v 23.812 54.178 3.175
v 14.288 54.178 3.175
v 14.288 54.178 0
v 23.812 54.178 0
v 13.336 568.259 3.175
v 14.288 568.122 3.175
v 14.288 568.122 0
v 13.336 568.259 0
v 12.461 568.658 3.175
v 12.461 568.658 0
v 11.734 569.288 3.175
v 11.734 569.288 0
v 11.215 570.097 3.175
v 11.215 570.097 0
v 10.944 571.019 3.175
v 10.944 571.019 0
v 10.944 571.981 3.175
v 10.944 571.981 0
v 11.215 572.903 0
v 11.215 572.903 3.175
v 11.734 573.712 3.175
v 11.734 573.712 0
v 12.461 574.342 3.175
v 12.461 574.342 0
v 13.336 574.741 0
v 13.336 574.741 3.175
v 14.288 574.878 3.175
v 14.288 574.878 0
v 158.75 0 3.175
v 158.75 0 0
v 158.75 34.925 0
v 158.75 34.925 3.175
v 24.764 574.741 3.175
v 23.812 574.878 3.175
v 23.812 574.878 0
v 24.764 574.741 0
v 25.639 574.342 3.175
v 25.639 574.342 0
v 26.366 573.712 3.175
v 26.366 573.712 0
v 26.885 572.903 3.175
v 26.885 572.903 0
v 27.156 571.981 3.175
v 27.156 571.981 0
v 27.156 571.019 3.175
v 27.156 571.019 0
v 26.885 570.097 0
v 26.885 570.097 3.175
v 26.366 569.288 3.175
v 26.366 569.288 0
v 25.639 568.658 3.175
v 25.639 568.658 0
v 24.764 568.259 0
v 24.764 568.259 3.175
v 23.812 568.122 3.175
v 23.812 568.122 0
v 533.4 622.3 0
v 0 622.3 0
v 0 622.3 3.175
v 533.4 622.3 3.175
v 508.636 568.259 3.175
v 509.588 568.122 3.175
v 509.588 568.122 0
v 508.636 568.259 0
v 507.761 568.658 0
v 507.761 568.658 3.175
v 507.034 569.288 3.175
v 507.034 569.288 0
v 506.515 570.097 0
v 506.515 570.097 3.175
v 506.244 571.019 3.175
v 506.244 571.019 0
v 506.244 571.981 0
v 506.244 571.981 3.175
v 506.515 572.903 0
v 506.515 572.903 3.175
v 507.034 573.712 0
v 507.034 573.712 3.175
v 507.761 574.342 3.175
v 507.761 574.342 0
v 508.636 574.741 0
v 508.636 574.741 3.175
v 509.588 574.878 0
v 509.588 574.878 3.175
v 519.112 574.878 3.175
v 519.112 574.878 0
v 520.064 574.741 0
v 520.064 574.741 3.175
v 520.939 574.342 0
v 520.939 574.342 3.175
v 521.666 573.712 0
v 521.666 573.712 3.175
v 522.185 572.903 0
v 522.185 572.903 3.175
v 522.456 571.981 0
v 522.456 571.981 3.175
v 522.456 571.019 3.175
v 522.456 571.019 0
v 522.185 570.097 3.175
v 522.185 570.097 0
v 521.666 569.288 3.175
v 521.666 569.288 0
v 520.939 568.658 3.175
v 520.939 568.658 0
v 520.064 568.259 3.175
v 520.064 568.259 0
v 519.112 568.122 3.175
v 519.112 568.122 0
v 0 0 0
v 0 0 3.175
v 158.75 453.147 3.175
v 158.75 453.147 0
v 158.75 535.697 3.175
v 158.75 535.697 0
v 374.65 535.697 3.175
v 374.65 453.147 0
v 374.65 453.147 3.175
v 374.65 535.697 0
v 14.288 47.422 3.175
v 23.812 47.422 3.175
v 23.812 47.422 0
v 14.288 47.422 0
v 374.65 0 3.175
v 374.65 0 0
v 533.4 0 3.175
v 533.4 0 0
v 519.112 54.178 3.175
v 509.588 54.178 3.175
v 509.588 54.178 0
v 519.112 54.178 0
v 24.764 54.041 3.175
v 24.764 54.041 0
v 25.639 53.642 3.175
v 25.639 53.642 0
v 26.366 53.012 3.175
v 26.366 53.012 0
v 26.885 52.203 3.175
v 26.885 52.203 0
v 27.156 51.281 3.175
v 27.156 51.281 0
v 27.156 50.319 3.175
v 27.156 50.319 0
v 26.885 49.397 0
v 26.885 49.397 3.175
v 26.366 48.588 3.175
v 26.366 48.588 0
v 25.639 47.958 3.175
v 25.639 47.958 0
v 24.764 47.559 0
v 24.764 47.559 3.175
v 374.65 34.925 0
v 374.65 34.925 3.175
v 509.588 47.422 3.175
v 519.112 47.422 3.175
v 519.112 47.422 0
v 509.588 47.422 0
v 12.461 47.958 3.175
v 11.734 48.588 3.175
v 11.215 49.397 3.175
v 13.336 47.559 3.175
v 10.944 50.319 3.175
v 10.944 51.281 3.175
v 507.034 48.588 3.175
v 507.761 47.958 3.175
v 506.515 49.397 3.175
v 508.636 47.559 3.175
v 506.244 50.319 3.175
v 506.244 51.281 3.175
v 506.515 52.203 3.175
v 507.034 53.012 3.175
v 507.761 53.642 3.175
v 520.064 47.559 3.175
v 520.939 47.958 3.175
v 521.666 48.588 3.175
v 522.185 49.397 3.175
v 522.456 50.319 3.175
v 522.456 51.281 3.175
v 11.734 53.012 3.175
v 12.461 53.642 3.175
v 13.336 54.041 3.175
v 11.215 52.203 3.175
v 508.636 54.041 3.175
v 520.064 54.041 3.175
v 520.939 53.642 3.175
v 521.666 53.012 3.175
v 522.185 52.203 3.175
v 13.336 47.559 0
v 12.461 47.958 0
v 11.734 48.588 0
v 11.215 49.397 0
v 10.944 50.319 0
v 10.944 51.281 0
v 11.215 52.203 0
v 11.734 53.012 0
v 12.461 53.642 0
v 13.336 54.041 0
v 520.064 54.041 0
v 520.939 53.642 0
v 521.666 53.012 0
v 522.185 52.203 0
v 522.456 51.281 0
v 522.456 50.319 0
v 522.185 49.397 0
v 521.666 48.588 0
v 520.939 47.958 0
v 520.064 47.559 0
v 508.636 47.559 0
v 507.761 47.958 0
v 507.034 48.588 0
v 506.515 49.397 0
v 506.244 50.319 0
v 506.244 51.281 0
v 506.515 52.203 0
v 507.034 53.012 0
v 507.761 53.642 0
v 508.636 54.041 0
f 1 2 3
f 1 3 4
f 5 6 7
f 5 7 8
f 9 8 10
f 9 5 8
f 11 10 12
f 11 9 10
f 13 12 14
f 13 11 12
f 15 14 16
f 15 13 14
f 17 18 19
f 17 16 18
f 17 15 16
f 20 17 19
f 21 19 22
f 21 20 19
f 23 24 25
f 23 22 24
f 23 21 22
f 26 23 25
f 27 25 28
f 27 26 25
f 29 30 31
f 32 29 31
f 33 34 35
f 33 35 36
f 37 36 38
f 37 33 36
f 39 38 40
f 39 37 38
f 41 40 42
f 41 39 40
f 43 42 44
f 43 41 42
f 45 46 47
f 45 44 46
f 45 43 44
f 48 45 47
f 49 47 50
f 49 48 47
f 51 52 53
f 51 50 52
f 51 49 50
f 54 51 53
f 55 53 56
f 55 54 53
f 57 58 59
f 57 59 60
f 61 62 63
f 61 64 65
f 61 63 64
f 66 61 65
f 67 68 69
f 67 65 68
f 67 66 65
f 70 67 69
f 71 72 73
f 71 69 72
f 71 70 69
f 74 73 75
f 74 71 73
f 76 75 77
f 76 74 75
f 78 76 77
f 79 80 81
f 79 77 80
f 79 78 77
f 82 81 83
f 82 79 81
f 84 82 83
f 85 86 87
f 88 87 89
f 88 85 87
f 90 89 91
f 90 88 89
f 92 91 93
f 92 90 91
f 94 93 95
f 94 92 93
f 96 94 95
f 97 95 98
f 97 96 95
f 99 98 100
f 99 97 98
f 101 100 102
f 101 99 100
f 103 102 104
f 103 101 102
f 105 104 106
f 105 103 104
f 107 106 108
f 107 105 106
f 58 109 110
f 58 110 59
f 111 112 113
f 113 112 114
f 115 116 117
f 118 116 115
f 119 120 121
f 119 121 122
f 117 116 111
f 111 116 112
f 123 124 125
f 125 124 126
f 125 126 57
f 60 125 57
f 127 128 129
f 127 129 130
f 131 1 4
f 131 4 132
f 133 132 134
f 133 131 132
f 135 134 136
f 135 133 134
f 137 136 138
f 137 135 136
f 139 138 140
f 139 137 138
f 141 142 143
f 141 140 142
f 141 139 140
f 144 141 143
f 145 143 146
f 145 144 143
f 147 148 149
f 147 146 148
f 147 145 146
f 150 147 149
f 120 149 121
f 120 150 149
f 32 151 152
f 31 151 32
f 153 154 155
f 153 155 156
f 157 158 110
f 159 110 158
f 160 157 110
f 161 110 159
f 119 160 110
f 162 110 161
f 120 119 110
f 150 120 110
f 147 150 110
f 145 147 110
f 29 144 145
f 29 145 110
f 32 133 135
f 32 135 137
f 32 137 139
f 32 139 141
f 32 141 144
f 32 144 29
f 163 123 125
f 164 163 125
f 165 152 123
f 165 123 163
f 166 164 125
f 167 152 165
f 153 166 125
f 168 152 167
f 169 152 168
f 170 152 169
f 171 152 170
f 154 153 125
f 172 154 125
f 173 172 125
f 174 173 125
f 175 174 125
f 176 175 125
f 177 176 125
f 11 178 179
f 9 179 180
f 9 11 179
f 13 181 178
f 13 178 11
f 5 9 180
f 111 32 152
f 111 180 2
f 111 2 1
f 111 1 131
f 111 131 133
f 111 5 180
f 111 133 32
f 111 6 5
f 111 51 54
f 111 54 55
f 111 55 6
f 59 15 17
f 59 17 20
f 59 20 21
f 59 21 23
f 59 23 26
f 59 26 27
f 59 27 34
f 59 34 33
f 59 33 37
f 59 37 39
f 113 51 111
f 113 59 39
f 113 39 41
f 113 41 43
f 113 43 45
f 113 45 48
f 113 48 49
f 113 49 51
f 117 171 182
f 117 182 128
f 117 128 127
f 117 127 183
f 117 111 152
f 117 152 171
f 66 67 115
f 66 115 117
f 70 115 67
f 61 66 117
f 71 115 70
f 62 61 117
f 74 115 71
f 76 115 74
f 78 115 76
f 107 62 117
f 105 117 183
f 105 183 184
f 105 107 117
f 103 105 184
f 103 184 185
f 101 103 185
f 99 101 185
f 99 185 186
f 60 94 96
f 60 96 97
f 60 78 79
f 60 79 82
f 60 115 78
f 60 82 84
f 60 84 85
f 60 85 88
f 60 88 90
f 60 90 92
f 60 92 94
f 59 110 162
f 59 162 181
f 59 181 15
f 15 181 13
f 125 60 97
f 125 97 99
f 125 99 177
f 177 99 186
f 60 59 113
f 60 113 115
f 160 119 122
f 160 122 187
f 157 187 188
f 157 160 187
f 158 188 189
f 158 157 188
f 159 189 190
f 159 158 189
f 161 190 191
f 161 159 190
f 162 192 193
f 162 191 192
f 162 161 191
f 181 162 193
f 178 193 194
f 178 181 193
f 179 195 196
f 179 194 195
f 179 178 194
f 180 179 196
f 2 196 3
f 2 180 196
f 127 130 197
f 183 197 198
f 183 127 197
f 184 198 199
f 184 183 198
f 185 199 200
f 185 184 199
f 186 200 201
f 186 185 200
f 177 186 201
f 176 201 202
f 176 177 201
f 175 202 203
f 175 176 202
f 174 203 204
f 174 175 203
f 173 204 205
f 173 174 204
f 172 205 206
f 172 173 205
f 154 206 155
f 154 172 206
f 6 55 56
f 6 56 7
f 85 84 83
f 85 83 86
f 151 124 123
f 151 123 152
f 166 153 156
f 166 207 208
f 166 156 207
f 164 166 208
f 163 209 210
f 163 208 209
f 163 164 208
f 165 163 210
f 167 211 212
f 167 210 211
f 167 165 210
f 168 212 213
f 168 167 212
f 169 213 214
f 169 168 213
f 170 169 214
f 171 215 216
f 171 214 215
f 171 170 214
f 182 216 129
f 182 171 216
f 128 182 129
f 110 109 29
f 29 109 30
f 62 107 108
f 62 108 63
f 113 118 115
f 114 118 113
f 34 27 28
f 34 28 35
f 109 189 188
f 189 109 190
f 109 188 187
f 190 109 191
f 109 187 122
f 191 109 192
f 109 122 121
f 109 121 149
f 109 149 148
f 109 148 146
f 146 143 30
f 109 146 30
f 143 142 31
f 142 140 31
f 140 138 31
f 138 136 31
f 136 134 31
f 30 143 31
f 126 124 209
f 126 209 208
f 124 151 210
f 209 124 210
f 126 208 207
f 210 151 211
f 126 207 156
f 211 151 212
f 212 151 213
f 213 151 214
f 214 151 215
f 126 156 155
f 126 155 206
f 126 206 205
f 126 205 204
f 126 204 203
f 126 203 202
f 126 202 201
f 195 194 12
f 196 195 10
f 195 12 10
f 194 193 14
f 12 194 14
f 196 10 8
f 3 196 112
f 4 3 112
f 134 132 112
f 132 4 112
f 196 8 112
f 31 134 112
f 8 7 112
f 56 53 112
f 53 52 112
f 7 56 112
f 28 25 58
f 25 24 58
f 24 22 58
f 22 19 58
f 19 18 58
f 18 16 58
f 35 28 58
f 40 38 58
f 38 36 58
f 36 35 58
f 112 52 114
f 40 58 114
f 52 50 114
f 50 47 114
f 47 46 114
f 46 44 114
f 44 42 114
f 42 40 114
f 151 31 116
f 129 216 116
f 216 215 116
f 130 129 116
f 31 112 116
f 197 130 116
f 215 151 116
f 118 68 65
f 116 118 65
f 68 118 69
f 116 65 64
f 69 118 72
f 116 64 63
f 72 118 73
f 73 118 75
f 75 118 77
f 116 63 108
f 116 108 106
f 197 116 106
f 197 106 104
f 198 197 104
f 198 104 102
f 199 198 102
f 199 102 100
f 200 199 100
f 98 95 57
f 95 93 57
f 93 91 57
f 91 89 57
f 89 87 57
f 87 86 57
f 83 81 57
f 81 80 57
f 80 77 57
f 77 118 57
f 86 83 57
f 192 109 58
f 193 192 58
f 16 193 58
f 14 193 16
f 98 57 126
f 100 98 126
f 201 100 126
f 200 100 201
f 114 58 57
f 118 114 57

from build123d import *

# Parameters (mm, degrees)
SKETCH1_W            = 533.4
SKETCH1_H            = 622.3
BOSS_EXTRUDE1_DEPTH  = 3.175
CUT_EXTRUDE1_DEPTH   = 4.175
LPATTERN1_COUNT      = 2
LPATTERN1_PITCH      = 520.7
LPATTERN1_COUNT_DIR2 = 2
LPATTERN1_PITCH_DIR2 = 495.3
SKETCH5_W            = 215.9
SKETCH5_H            = 82.55
CUT_EXTRUDE3_DEPTH   = 4.175
SKETCH6_W            = 215.9
SKETCH6_H            = 34.925
CUT_EXTRUDE4_DEPTH   = 4.175


with BuildPart() as part:
    # Sketch1 → Boss-Extrude1 (new body)
    with BuildSketch(Plane.XY):
        with Locations((266.7, 311.15)):
            Rectangle(SKETCH1_W, SKETCH1_H)
    extrude(amount=BOSS_EXTRUDE1_DEPTH)

    # Sketch2 → Cut-Extrude1 (cut, through all)
    with BuildSketch(Plane.XY.offset(3.175)):
        with BuildLine():
            Line((14.2875, 574.8782), (23.8125, 574.8782))
            ThreePointArc((23.8125, 574.8782), (27.1907, 571.5), (23.8125, 568.1218))
            Line((23.8125, 568.1218), (14.2875, 568.1218))
            ThreePointArc((14.2875, 568.1218), (10.9093, 571.5), (14.2875, 574.8782))
        make_face()
    cut_extrude1 = extrude(amount=-CUT_EXTRUDE1_DEPTH, mode=Mode.SUBTRACT)

    # LPattern1: Cut-Extrude1 2 × 2
    with Locations(*[(j * LPATTERN1_PITCH_DIR2, -i * LPATTERN1_PITCH, 0) for i in range(LPATTERN1_COUNT) for j in range(LPATTERN1_COUNT_DIR2) if (i, j) != (0, 0)]):
        add(cut_extrude1, mode=Mode.SUBTRACT)

    # Sketch5 → Cut-Extrude3 (cut, through all)
    with BuildSketch(Plane(origin=(0, 0, 0), x_dir=(-1, 0, 0), z_dir=(0, 0, -1))):
        with Locations((-266.7, 494.422045059)):
            Rectangle(SKETCH5_W, SKETCH5_H)
    extrude(amount=-CUT_EXTRUDE3_DEPTH, mode=Mode.SUBTRACT)

    # Sketch6 → Cut-Extrude4 (cut, through all)
    with BuildSketch(Plane(origin=(0, 0, 0), x_dir=(-1, 0, 0), z_dir=(0, 0, -1))):
        with Locations((-266.7, 17.4625)):
            Rectangle(SKETCH6_W, SKETCH6_H)
    extrude(amount=-CUT_EXTRUDE4_DEPTH, mode=Mode.SUBTRACT)


solid = part.part
